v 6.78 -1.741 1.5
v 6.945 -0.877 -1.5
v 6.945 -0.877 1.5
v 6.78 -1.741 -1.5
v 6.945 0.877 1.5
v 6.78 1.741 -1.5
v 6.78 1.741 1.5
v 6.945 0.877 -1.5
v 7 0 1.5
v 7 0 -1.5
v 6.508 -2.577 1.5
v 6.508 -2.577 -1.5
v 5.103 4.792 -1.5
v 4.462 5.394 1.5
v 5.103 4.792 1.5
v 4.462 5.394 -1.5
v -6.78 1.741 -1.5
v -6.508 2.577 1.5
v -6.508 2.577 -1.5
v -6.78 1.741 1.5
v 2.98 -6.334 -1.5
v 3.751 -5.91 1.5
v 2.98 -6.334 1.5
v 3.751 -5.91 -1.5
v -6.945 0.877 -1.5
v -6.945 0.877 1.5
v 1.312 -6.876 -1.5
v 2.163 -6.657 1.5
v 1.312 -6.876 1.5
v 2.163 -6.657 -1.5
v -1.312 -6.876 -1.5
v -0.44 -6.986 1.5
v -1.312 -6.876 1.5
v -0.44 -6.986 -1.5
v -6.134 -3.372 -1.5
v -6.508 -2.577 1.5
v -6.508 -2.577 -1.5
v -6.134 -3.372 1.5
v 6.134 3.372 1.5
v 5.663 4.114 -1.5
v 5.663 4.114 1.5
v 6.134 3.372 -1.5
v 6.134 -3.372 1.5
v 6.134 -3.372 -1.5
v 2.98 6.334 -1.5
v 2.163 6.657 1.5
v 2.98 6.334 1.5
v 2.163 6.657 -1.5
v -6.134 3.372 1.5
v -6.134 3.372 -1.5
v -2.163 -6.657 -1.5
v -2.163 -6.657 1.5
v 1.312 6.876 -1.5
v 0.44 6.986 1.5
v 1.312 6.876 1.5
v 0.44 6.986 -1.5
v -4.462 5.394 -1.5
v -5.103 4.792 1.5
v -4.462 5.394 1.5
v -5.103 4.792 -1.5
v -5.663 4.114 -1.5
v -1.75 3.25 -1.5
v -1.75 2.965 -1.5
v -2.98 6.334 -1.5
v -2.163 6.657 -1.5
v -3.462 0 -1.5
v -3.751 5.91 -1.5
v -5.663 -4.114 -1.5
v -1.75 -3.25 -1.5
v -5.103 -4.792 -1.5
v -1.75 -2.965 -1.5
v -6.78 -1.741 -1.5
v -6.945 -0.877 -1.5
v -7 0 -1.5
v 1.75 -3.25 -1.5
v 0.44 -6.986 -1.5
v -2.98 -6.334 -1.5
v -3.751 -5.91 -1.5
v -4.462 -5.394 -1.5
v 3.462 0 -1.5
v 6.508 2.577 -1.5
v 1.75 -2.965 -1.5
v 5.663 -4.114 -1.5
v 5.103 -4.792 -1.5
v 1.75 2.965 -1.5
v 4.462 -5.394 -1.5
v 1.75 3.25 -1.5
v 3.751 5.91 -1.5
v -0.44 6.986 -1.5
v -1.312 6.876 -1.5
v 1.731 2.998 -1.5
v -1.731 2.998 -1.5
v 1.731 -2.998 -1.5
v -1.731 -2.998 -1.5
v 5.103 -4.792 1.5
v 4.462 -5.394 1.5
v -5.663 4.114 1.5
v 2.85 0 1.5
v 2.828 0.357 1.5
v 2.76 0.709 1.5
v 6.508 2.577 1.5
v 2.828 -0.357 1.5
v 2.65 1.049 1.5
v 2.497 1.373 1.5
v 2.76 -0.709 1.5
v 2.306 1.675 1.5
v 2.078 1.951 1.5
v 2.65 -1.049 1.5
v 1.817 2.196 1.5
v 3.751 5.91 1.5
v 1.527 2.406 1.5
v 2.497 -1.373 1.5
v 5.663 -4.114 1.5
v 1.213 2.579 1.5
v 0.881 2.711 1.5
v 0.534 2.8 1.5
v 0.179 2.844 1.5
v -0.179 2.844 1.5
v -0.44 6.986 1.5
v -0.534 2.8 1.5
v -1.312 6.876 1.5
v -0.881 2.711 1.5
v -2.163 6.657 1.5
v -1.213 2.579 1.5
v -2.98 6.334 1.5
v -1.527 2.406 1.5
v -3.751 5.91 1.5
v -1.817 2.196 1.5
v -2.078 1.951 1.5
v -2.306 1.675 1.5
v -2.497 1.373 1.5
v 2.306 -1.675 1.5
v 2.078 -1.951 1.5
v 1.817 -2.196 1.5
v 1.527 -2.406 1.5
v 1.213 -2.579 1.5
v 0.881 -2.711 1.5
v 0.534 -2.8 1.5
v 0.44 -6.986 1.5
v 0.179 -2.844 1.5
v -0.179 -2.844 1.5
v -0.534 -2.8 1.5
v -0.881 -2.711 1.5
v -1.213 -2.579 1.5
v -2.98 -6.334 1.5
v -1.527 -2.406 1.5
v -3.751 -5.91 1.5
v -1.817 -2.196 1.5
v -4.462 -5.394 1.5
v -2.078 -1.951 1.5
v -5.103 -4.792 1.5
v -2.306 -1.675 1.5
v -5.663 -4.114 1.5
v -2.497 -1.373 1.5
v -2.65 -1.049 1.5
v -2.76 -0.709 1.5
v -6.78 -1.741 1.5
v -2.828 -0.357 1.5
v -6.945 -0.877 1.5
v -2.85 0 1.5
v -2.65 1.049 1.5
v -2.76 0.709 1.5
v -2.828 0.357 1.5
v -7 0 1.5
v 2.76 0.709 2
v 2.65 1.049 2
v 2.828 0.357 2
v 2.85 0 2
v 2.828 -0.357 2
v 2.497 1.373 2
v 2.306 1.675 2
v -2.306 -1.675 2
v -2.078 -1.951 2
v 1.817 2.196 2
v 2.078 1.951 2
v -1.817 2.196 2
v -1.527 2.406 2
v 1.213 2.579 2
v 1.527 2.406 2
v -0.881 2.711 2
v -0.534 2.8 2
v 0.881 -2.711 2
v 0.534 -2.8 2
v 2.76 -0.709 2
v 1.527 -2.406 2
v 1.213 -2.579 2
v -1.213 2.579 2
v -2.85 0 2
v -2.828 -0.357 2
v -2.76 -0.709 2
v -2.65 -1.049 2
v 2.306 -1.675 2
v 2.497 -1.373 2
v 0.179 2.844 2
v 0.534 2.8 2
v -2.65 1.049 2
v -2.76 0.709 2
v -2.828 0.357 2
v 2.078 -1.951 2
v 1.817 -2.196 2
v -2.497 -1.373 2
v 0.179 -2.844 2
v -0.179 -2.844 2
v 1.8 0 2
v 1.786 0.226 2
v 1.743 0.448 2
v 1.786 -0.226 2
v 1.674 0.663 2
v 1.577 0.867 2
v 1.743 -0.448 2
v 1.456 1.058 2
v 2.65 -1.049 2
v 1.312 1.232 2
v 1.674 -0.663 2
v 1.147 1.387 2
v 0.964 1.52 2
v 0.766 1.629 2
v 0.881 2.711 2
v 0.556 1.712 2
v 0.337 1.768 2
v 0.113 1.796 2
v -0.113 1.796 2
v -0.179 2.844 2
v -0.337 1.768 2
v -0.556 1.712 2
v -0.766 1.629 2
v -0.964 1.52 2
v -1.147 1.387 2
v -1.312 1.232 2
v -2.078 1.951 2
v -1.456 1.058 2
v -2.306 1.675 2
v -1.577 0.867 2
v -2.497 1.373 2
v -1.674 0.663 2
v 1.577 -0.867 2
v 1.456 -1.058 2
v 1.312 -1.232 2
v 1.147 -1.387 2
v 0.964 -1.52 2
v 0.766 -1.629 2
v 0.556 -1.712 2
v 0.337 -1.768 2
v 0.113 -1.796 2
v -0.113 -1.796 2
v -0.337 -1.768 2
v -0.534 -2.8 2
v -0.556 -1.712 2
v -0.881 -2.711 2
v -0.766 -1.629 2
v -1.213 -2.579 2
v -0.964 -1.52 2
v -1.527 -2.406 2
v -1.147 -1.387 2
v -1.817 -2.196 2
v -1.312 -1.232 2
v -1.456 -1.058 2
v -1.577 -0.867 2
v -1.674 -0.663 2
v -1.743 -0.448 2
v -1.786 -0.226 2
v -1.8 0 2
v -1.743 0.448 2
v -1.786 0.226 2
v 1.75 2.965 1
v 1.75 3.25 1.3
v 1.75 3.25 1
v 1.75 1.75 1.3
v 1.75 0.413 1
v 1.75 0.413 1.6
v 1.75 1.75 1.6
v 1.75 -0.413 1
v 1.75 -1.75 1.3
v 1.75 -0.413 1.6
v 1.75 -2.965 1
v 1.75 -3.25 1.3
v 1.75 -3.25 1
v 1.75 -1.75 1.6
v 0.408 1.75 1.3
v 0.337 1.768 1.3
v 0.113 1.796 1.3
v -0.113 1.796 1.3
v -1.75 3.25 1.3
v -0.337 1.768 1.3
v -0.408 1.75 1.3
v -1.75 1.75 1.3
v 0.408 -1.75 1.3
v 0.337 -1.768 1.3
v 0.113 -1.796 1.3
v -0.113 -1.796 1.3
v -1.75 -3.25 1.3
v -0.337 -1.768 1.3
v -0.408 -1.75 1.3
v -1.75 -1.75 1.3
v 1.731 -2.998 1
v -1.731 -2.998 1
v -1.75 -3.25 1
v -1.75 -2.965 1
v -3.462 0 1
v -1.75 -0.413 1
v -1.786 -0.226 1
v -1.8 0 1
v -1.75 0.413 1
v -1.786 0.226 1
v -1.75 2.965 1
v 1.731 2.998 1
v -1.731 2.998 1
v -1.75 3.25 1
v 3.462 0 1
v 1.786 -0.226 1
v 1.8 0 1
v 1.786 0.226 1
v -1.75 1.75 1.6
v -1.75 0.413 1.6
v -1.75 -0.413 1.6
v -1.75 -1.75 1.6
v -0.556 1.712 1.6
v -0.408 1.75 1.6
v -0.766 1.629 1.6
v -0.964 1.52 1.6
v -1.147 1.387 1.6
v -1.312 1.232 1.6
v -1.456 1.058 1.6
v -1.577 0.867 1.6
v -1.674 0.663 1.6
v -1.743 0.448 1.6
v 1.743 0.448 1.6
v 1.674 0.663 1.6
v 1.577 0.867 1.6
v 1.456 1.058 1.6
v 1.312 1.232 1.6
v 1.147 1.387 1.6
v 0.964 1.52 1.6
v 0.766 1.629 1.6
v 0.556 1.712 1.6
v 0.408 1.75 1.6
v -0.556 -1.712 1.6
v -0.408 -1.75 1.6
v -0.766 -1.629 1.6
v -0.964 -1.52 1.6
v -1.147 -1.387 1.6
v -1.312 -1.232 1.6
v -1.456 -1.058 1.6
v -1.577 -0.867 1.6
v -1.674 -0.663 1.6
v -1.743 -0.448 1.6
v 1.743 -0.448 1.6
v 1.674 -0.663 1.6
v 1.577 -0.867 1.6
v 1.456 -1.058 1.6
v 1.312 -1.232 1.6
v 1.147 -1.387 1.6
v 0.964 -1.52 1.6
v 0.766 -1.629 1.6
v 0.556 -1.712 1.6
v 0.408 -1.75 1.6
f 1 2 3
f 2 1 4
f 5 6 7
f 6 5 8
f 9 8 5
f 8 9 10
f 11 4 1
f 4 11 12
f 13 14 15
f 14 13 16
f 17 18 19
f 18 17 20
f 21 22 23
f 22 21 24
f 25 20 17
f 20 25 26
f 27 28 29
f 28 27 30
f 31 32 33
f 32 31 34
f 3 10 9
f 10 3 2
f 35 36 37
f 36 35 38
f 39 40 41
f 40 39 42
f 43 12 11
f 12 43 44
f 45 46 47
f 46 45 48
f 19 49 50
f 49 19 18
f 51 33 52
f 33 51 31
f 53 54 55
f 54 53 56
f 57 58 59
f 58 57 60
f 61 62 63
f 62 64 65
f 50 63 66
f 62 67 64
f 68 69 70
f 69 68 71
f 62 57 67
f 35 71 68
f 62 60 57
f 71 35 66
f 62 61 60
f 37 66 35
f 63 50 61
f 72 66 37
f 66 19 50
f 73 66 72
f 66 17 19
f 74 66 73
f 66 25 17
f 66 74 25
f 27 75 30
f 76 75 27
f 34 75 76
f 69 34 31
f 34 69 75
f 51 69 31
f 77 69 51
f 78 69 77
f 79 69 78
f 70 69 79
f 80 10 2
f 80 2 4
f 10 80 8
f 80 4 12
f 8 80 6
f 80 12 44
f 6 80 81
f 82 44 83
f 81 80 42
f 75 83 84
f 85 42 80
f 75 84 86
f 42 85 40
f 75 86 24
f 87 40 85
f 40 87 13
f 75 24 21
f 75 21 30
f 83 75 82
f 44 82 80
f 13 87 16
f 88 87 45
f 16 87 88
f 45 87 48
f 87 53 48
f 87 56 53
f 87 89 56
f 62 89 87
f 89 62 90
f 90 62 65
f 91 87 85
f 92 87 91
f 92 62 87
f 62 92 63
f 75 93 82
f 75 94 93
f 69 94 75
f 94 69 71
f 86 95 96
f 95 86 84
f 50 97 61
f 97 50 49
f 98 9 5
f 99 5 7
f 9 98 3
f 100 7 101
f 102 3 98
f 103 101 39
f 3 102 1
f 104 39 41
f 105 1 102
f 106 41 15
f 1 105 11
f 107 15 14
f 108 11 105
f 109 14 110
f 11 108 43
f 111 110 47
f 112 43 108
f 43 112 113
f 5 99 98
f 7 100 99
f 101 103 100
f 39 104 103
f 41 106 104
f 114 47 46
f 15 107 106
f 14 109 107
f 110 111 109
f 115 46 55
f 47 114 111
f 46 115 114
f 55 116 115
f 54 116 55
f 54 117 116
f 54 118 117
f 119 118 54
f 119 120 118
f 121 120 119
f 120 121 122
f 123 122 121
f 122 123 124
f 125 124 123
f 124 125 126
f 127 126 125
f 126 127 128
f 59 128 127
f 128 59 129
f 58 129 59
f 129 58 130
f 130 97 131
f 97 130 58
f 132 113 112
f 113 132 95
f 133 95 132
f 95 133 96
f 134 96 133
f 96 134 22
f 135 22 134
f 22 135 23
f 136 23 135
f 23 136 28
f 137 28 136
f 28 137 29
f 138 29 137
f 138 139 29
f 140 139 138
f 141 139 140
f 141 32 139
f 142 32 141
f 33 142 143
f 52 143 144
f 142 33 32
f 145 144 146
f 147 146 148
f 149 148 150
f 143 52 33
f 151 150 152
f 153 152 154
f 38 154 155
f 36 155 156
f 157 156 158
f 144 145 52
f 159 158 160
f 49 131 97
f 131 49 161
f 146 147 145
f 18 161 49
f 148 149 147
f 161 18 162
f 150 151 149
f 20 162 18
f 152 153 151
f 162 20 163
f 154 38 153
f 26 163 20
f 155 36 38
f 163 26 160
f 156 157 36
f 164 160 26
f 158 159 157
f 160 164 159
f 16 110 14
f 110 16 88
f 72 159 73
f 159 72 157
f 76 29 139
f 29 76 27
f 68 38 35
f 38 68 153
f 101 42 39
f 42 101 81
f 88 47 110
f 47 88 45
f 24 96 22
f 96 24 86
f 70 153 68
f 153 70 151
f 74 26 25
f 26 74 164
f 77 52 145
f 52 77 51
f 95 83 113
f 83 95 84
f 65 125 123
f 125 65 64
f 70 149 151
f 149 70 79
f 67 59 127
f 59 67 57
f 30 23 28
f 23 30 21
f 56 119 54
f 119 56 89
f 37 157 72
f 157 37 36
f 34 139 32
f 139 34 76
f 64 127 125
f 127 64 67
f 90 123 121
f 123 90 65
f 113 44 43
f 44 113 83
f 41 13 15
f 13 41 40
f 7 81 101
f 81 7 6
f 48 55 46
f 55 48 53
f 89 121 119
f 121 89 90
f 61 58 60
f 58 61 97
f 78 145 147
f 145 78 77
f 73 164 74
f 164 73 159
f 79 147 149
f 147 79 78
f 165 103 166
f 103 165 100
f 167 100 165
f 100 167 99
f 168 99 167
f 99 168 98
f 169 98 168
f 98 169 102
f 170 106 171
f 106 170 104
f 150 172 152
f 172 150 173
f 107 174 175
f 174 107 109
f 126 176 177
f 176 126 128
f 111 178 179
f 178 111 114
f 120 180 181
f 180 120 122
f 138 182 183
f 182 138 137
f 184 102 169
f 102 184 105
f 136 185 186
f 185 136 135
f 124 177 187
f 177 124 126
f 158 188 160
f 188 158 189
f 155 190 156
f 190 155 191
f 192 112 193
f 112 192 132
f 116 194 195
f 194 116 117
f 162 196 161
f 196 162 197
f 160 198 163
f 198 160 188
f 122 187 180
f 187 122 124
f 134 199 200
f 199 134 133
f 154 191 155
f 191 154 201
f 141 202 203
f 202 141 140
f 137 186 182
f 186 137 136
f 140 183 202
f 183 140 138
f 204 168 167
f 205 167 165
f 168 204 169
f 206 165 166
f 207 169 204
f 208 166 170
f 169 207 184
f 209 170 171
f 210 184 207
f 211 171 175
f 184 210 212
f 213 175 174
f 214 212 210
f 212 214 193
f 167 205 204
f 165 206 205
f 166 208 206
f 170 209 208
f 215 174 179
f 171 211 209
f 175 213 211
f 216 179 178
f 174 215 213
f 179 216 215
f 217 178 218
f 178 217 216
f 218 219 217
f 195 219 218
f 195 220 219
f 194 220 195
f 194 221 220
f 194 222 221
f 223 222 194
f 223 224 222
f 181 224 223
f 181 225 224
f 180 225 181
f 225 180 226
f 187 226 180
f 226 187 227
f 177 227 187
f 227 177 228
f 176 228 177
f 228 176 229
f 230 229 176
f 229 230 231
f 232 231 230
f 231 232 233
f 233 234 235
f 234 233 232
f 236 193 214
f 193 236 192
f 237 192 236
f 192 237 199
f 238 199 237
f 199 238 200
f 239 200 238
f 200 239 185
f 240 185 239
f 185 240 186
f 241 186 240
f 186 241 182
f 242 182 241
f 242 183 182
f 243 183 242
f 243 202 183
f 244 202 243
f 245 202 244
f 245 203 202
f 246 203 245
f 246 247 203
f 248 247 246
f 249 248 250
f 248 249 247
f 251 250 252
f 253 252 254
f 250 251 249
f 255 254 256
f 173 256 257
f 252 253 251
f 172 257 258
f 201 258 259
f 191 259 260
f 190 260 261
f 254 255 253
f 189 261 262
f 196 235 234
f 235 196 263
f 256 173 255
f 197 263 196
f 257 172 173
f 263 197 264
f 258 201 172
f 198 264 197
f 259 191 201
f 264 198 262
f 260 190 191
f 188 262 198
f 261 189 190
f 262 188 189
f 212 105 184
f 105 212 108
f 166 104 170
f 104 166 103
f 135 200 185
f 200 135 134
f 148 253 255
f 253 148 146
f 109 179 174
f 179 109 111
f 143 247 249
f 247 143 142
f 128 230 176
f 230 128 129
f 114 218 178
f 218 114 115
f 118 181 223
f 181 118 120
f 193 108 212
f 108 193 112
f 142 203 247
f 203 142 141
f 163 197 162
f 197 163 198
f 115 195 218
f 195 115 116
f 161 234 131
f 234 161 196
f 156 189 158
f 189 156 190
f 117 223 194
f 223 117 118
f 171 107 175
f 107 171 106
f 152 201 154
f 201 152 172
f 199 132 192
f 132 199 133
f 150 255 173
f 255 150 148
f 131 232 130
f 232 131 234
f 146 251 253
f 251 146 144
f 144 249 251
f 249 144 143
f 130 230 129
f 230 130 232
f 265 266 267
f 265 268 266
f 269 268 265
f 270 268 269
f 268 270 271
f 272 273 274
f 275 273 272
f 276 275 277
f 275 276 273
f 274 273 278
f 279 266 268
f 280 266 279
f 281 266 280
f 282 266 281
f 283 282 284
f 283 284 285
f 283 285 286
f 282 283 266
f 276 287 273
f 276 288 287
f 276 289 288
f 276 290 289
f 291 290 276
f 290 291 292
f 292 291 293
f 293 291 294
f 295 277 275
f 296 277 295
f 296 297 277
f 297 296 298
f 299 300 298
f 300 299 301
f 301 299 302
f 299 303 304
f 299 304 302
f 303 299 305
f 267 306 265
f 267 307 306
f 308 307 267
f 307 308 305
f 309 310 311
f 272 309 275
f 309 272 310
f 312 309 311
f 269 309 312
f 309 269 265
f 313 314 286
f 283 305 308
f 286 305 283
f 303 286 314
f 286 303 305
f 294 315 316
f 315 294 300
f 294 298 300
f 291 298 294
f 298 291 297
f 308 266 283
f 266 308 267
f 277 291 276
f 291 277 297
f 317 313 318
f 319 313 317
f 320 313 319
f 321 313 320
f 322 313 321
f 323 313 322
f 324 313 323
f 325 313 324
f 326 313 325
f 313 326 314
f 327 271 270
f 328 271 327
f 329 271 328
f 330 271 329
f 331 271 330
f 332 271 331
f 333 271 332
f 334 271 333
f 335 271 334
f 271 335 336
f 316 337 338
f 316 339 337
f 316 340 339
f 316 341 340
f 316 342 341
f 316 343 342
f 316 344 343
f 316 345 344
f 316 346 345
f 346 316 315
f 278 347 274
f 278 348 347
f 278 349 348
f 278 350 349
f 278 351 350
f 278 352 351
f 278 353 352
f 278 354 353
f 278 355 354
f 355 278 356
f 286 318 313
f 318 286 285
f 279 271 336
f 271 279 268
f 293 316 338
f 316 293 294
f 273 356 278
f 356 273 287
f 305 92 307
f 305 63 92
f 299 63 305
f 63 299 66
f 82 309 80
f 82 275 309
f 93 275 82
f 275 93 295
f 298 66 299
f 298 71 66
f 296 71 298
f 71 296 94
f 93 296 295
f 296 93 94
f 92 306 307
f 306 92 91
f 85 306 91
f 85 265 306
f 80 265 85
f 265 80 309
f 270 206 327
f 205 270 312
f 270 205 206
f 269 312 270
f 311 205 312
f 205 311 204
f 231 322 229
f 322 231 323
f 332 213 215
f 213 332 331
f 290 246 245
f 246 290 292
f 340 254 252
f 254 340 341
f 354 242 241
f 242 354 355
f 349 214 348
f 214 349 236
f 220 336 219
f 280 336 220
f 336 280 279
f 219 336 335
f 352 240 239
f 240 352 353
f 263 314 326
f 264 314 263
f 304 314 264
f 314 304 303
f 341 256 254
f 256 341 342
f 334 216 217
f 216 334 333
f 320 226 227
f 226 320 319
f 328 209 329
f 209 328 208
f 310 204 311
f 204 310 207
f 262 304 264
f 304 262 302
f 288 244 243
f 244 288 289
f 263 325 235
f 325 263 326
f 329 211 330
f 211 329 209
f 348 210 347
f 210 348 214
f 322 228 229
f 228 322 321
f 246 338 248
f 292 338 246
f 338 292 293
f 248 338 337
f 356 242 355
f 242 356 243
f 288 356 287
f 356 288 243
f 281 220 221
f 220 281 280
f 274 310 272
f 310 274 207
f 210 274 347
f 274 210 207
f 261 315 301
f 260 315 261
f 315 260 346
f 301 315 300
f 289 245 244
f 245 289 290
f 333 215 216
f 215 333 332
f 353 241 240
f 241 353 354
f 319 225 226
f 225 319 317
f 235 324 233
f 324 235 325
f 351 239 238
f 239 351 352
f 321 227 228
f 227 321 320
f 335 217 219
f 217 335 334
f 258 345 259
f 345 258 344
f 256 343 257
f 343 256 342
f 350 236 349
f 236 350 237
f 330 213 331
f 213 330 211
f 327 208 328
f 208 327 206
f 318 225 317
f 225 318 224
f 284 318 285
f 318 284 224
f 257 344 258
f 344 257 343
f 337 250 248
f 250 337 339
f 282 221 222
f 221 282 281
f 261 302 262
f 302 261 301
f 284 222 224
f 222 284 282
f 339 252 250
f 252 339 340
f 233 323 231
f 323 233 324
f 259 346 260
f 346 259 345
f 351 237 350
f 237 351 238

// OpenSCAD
$fn = 50;


difference() {
	union() {
		translate(v = [0, 0, -1.5000000000]) {
			cylinder(h = 3, r = 7.0000000000);
		}
		translate(v = [0, 0, -1.5000000000]) {
			cylinder(h = 3.5000000000, r = 2.8500000000);
		}
	}
	union() {
		translate(v = [0, 0, -1.5000000000]) {
			rotate(a = [0, 0, 0]) {
				difference() {
					union() {
						translate(v = [-1.7500000000, -3.2500000000, -0.3000000000]) {
							cube(size = [3.5000000000, 6.5000000000, 0.3000000000]);
						}
						translate(v = [-1.7500000000, -1.7500000000, -0.6000000000]) {
							cube(size = [3.5000000000, 3.5000000000, 0.3000000000]);
						}
						translate(v = [-1.7500000000, -3.2500000000, 2.5000000000]) {
							cube(size = [3.5000000000, 6.5000000000, 0.3000000000]);
						}
						translate(v = [-1.7500000000, -1.7500000000, 2.8000000000]) {
							cube(size = [3.5000000000, 3.5000000000, 0.3000000000]);
						}
						linear_extrude(height = 2.5000000000) {
							polygon(points = [[3.4620000000, 0.0000000000], [1.7310000000, 2.9981799479], [-1.7310000000, 2.9981799479], [-3.4620000000, 0.0000000000], [-1.7310000000, -2.9981799479], [1.7310000000, -2.9981799479]]);
						}
						translate(v = [-1.7500000000, -3.2500000000, -0.3000000000]) {
							cube(size = [3.5000000000, 6.5000000000, 0.3000000000]);
						}
						translate(v = [-1.7500000000, -1.7500000000, -0.6000000000]) {
							cube(size = [3.5000000000, 3.5000000000, 0.3000000000]);
						}
						translate(v = [-1.7500000000, -3.2500000000, 2.5000000000]) {
							cube(size = [3.5000000000, 6.5000000000, 0.3000000000]);
						}
						translate(v = [-1.7500000000, -1.7500000000, 2.8000000000]) {
							cube(size = [3.5000000000, 3.5000000000, 0.3000000000]);
						}
						translate(v = [-1.7500000000, -3.2500000000, -0.3000000000]) {
							cube(size = [3.5000000000, 6.5000000000, 0.3000000000]);
						}
						translate(v = [-1.7500000000, -1.7500000000, -0.6000000000]) {
							cube(size = [3.5000000000, 3.5000000000, 0.3000000000]);
						}
						translate(v = [-1.7500000000, -3.2500000000, 2.5000000000]) {
							cube(size = [3.5000000000, 6.5000000000, 0.3000000000]);
						}
						translate(v = [-1.7500000000, -1.7500000000, 2.8000000000]) {
							cube(size = [3.5000000000, 3.5000000000, 0.3000000000]);
						}
					}
					union();
				}
			}
		}
		translate(v = [0, 0, -100.0000000000]) {
			cylinder(h = 200, r = 1.8000000000);
		}
	}
}
